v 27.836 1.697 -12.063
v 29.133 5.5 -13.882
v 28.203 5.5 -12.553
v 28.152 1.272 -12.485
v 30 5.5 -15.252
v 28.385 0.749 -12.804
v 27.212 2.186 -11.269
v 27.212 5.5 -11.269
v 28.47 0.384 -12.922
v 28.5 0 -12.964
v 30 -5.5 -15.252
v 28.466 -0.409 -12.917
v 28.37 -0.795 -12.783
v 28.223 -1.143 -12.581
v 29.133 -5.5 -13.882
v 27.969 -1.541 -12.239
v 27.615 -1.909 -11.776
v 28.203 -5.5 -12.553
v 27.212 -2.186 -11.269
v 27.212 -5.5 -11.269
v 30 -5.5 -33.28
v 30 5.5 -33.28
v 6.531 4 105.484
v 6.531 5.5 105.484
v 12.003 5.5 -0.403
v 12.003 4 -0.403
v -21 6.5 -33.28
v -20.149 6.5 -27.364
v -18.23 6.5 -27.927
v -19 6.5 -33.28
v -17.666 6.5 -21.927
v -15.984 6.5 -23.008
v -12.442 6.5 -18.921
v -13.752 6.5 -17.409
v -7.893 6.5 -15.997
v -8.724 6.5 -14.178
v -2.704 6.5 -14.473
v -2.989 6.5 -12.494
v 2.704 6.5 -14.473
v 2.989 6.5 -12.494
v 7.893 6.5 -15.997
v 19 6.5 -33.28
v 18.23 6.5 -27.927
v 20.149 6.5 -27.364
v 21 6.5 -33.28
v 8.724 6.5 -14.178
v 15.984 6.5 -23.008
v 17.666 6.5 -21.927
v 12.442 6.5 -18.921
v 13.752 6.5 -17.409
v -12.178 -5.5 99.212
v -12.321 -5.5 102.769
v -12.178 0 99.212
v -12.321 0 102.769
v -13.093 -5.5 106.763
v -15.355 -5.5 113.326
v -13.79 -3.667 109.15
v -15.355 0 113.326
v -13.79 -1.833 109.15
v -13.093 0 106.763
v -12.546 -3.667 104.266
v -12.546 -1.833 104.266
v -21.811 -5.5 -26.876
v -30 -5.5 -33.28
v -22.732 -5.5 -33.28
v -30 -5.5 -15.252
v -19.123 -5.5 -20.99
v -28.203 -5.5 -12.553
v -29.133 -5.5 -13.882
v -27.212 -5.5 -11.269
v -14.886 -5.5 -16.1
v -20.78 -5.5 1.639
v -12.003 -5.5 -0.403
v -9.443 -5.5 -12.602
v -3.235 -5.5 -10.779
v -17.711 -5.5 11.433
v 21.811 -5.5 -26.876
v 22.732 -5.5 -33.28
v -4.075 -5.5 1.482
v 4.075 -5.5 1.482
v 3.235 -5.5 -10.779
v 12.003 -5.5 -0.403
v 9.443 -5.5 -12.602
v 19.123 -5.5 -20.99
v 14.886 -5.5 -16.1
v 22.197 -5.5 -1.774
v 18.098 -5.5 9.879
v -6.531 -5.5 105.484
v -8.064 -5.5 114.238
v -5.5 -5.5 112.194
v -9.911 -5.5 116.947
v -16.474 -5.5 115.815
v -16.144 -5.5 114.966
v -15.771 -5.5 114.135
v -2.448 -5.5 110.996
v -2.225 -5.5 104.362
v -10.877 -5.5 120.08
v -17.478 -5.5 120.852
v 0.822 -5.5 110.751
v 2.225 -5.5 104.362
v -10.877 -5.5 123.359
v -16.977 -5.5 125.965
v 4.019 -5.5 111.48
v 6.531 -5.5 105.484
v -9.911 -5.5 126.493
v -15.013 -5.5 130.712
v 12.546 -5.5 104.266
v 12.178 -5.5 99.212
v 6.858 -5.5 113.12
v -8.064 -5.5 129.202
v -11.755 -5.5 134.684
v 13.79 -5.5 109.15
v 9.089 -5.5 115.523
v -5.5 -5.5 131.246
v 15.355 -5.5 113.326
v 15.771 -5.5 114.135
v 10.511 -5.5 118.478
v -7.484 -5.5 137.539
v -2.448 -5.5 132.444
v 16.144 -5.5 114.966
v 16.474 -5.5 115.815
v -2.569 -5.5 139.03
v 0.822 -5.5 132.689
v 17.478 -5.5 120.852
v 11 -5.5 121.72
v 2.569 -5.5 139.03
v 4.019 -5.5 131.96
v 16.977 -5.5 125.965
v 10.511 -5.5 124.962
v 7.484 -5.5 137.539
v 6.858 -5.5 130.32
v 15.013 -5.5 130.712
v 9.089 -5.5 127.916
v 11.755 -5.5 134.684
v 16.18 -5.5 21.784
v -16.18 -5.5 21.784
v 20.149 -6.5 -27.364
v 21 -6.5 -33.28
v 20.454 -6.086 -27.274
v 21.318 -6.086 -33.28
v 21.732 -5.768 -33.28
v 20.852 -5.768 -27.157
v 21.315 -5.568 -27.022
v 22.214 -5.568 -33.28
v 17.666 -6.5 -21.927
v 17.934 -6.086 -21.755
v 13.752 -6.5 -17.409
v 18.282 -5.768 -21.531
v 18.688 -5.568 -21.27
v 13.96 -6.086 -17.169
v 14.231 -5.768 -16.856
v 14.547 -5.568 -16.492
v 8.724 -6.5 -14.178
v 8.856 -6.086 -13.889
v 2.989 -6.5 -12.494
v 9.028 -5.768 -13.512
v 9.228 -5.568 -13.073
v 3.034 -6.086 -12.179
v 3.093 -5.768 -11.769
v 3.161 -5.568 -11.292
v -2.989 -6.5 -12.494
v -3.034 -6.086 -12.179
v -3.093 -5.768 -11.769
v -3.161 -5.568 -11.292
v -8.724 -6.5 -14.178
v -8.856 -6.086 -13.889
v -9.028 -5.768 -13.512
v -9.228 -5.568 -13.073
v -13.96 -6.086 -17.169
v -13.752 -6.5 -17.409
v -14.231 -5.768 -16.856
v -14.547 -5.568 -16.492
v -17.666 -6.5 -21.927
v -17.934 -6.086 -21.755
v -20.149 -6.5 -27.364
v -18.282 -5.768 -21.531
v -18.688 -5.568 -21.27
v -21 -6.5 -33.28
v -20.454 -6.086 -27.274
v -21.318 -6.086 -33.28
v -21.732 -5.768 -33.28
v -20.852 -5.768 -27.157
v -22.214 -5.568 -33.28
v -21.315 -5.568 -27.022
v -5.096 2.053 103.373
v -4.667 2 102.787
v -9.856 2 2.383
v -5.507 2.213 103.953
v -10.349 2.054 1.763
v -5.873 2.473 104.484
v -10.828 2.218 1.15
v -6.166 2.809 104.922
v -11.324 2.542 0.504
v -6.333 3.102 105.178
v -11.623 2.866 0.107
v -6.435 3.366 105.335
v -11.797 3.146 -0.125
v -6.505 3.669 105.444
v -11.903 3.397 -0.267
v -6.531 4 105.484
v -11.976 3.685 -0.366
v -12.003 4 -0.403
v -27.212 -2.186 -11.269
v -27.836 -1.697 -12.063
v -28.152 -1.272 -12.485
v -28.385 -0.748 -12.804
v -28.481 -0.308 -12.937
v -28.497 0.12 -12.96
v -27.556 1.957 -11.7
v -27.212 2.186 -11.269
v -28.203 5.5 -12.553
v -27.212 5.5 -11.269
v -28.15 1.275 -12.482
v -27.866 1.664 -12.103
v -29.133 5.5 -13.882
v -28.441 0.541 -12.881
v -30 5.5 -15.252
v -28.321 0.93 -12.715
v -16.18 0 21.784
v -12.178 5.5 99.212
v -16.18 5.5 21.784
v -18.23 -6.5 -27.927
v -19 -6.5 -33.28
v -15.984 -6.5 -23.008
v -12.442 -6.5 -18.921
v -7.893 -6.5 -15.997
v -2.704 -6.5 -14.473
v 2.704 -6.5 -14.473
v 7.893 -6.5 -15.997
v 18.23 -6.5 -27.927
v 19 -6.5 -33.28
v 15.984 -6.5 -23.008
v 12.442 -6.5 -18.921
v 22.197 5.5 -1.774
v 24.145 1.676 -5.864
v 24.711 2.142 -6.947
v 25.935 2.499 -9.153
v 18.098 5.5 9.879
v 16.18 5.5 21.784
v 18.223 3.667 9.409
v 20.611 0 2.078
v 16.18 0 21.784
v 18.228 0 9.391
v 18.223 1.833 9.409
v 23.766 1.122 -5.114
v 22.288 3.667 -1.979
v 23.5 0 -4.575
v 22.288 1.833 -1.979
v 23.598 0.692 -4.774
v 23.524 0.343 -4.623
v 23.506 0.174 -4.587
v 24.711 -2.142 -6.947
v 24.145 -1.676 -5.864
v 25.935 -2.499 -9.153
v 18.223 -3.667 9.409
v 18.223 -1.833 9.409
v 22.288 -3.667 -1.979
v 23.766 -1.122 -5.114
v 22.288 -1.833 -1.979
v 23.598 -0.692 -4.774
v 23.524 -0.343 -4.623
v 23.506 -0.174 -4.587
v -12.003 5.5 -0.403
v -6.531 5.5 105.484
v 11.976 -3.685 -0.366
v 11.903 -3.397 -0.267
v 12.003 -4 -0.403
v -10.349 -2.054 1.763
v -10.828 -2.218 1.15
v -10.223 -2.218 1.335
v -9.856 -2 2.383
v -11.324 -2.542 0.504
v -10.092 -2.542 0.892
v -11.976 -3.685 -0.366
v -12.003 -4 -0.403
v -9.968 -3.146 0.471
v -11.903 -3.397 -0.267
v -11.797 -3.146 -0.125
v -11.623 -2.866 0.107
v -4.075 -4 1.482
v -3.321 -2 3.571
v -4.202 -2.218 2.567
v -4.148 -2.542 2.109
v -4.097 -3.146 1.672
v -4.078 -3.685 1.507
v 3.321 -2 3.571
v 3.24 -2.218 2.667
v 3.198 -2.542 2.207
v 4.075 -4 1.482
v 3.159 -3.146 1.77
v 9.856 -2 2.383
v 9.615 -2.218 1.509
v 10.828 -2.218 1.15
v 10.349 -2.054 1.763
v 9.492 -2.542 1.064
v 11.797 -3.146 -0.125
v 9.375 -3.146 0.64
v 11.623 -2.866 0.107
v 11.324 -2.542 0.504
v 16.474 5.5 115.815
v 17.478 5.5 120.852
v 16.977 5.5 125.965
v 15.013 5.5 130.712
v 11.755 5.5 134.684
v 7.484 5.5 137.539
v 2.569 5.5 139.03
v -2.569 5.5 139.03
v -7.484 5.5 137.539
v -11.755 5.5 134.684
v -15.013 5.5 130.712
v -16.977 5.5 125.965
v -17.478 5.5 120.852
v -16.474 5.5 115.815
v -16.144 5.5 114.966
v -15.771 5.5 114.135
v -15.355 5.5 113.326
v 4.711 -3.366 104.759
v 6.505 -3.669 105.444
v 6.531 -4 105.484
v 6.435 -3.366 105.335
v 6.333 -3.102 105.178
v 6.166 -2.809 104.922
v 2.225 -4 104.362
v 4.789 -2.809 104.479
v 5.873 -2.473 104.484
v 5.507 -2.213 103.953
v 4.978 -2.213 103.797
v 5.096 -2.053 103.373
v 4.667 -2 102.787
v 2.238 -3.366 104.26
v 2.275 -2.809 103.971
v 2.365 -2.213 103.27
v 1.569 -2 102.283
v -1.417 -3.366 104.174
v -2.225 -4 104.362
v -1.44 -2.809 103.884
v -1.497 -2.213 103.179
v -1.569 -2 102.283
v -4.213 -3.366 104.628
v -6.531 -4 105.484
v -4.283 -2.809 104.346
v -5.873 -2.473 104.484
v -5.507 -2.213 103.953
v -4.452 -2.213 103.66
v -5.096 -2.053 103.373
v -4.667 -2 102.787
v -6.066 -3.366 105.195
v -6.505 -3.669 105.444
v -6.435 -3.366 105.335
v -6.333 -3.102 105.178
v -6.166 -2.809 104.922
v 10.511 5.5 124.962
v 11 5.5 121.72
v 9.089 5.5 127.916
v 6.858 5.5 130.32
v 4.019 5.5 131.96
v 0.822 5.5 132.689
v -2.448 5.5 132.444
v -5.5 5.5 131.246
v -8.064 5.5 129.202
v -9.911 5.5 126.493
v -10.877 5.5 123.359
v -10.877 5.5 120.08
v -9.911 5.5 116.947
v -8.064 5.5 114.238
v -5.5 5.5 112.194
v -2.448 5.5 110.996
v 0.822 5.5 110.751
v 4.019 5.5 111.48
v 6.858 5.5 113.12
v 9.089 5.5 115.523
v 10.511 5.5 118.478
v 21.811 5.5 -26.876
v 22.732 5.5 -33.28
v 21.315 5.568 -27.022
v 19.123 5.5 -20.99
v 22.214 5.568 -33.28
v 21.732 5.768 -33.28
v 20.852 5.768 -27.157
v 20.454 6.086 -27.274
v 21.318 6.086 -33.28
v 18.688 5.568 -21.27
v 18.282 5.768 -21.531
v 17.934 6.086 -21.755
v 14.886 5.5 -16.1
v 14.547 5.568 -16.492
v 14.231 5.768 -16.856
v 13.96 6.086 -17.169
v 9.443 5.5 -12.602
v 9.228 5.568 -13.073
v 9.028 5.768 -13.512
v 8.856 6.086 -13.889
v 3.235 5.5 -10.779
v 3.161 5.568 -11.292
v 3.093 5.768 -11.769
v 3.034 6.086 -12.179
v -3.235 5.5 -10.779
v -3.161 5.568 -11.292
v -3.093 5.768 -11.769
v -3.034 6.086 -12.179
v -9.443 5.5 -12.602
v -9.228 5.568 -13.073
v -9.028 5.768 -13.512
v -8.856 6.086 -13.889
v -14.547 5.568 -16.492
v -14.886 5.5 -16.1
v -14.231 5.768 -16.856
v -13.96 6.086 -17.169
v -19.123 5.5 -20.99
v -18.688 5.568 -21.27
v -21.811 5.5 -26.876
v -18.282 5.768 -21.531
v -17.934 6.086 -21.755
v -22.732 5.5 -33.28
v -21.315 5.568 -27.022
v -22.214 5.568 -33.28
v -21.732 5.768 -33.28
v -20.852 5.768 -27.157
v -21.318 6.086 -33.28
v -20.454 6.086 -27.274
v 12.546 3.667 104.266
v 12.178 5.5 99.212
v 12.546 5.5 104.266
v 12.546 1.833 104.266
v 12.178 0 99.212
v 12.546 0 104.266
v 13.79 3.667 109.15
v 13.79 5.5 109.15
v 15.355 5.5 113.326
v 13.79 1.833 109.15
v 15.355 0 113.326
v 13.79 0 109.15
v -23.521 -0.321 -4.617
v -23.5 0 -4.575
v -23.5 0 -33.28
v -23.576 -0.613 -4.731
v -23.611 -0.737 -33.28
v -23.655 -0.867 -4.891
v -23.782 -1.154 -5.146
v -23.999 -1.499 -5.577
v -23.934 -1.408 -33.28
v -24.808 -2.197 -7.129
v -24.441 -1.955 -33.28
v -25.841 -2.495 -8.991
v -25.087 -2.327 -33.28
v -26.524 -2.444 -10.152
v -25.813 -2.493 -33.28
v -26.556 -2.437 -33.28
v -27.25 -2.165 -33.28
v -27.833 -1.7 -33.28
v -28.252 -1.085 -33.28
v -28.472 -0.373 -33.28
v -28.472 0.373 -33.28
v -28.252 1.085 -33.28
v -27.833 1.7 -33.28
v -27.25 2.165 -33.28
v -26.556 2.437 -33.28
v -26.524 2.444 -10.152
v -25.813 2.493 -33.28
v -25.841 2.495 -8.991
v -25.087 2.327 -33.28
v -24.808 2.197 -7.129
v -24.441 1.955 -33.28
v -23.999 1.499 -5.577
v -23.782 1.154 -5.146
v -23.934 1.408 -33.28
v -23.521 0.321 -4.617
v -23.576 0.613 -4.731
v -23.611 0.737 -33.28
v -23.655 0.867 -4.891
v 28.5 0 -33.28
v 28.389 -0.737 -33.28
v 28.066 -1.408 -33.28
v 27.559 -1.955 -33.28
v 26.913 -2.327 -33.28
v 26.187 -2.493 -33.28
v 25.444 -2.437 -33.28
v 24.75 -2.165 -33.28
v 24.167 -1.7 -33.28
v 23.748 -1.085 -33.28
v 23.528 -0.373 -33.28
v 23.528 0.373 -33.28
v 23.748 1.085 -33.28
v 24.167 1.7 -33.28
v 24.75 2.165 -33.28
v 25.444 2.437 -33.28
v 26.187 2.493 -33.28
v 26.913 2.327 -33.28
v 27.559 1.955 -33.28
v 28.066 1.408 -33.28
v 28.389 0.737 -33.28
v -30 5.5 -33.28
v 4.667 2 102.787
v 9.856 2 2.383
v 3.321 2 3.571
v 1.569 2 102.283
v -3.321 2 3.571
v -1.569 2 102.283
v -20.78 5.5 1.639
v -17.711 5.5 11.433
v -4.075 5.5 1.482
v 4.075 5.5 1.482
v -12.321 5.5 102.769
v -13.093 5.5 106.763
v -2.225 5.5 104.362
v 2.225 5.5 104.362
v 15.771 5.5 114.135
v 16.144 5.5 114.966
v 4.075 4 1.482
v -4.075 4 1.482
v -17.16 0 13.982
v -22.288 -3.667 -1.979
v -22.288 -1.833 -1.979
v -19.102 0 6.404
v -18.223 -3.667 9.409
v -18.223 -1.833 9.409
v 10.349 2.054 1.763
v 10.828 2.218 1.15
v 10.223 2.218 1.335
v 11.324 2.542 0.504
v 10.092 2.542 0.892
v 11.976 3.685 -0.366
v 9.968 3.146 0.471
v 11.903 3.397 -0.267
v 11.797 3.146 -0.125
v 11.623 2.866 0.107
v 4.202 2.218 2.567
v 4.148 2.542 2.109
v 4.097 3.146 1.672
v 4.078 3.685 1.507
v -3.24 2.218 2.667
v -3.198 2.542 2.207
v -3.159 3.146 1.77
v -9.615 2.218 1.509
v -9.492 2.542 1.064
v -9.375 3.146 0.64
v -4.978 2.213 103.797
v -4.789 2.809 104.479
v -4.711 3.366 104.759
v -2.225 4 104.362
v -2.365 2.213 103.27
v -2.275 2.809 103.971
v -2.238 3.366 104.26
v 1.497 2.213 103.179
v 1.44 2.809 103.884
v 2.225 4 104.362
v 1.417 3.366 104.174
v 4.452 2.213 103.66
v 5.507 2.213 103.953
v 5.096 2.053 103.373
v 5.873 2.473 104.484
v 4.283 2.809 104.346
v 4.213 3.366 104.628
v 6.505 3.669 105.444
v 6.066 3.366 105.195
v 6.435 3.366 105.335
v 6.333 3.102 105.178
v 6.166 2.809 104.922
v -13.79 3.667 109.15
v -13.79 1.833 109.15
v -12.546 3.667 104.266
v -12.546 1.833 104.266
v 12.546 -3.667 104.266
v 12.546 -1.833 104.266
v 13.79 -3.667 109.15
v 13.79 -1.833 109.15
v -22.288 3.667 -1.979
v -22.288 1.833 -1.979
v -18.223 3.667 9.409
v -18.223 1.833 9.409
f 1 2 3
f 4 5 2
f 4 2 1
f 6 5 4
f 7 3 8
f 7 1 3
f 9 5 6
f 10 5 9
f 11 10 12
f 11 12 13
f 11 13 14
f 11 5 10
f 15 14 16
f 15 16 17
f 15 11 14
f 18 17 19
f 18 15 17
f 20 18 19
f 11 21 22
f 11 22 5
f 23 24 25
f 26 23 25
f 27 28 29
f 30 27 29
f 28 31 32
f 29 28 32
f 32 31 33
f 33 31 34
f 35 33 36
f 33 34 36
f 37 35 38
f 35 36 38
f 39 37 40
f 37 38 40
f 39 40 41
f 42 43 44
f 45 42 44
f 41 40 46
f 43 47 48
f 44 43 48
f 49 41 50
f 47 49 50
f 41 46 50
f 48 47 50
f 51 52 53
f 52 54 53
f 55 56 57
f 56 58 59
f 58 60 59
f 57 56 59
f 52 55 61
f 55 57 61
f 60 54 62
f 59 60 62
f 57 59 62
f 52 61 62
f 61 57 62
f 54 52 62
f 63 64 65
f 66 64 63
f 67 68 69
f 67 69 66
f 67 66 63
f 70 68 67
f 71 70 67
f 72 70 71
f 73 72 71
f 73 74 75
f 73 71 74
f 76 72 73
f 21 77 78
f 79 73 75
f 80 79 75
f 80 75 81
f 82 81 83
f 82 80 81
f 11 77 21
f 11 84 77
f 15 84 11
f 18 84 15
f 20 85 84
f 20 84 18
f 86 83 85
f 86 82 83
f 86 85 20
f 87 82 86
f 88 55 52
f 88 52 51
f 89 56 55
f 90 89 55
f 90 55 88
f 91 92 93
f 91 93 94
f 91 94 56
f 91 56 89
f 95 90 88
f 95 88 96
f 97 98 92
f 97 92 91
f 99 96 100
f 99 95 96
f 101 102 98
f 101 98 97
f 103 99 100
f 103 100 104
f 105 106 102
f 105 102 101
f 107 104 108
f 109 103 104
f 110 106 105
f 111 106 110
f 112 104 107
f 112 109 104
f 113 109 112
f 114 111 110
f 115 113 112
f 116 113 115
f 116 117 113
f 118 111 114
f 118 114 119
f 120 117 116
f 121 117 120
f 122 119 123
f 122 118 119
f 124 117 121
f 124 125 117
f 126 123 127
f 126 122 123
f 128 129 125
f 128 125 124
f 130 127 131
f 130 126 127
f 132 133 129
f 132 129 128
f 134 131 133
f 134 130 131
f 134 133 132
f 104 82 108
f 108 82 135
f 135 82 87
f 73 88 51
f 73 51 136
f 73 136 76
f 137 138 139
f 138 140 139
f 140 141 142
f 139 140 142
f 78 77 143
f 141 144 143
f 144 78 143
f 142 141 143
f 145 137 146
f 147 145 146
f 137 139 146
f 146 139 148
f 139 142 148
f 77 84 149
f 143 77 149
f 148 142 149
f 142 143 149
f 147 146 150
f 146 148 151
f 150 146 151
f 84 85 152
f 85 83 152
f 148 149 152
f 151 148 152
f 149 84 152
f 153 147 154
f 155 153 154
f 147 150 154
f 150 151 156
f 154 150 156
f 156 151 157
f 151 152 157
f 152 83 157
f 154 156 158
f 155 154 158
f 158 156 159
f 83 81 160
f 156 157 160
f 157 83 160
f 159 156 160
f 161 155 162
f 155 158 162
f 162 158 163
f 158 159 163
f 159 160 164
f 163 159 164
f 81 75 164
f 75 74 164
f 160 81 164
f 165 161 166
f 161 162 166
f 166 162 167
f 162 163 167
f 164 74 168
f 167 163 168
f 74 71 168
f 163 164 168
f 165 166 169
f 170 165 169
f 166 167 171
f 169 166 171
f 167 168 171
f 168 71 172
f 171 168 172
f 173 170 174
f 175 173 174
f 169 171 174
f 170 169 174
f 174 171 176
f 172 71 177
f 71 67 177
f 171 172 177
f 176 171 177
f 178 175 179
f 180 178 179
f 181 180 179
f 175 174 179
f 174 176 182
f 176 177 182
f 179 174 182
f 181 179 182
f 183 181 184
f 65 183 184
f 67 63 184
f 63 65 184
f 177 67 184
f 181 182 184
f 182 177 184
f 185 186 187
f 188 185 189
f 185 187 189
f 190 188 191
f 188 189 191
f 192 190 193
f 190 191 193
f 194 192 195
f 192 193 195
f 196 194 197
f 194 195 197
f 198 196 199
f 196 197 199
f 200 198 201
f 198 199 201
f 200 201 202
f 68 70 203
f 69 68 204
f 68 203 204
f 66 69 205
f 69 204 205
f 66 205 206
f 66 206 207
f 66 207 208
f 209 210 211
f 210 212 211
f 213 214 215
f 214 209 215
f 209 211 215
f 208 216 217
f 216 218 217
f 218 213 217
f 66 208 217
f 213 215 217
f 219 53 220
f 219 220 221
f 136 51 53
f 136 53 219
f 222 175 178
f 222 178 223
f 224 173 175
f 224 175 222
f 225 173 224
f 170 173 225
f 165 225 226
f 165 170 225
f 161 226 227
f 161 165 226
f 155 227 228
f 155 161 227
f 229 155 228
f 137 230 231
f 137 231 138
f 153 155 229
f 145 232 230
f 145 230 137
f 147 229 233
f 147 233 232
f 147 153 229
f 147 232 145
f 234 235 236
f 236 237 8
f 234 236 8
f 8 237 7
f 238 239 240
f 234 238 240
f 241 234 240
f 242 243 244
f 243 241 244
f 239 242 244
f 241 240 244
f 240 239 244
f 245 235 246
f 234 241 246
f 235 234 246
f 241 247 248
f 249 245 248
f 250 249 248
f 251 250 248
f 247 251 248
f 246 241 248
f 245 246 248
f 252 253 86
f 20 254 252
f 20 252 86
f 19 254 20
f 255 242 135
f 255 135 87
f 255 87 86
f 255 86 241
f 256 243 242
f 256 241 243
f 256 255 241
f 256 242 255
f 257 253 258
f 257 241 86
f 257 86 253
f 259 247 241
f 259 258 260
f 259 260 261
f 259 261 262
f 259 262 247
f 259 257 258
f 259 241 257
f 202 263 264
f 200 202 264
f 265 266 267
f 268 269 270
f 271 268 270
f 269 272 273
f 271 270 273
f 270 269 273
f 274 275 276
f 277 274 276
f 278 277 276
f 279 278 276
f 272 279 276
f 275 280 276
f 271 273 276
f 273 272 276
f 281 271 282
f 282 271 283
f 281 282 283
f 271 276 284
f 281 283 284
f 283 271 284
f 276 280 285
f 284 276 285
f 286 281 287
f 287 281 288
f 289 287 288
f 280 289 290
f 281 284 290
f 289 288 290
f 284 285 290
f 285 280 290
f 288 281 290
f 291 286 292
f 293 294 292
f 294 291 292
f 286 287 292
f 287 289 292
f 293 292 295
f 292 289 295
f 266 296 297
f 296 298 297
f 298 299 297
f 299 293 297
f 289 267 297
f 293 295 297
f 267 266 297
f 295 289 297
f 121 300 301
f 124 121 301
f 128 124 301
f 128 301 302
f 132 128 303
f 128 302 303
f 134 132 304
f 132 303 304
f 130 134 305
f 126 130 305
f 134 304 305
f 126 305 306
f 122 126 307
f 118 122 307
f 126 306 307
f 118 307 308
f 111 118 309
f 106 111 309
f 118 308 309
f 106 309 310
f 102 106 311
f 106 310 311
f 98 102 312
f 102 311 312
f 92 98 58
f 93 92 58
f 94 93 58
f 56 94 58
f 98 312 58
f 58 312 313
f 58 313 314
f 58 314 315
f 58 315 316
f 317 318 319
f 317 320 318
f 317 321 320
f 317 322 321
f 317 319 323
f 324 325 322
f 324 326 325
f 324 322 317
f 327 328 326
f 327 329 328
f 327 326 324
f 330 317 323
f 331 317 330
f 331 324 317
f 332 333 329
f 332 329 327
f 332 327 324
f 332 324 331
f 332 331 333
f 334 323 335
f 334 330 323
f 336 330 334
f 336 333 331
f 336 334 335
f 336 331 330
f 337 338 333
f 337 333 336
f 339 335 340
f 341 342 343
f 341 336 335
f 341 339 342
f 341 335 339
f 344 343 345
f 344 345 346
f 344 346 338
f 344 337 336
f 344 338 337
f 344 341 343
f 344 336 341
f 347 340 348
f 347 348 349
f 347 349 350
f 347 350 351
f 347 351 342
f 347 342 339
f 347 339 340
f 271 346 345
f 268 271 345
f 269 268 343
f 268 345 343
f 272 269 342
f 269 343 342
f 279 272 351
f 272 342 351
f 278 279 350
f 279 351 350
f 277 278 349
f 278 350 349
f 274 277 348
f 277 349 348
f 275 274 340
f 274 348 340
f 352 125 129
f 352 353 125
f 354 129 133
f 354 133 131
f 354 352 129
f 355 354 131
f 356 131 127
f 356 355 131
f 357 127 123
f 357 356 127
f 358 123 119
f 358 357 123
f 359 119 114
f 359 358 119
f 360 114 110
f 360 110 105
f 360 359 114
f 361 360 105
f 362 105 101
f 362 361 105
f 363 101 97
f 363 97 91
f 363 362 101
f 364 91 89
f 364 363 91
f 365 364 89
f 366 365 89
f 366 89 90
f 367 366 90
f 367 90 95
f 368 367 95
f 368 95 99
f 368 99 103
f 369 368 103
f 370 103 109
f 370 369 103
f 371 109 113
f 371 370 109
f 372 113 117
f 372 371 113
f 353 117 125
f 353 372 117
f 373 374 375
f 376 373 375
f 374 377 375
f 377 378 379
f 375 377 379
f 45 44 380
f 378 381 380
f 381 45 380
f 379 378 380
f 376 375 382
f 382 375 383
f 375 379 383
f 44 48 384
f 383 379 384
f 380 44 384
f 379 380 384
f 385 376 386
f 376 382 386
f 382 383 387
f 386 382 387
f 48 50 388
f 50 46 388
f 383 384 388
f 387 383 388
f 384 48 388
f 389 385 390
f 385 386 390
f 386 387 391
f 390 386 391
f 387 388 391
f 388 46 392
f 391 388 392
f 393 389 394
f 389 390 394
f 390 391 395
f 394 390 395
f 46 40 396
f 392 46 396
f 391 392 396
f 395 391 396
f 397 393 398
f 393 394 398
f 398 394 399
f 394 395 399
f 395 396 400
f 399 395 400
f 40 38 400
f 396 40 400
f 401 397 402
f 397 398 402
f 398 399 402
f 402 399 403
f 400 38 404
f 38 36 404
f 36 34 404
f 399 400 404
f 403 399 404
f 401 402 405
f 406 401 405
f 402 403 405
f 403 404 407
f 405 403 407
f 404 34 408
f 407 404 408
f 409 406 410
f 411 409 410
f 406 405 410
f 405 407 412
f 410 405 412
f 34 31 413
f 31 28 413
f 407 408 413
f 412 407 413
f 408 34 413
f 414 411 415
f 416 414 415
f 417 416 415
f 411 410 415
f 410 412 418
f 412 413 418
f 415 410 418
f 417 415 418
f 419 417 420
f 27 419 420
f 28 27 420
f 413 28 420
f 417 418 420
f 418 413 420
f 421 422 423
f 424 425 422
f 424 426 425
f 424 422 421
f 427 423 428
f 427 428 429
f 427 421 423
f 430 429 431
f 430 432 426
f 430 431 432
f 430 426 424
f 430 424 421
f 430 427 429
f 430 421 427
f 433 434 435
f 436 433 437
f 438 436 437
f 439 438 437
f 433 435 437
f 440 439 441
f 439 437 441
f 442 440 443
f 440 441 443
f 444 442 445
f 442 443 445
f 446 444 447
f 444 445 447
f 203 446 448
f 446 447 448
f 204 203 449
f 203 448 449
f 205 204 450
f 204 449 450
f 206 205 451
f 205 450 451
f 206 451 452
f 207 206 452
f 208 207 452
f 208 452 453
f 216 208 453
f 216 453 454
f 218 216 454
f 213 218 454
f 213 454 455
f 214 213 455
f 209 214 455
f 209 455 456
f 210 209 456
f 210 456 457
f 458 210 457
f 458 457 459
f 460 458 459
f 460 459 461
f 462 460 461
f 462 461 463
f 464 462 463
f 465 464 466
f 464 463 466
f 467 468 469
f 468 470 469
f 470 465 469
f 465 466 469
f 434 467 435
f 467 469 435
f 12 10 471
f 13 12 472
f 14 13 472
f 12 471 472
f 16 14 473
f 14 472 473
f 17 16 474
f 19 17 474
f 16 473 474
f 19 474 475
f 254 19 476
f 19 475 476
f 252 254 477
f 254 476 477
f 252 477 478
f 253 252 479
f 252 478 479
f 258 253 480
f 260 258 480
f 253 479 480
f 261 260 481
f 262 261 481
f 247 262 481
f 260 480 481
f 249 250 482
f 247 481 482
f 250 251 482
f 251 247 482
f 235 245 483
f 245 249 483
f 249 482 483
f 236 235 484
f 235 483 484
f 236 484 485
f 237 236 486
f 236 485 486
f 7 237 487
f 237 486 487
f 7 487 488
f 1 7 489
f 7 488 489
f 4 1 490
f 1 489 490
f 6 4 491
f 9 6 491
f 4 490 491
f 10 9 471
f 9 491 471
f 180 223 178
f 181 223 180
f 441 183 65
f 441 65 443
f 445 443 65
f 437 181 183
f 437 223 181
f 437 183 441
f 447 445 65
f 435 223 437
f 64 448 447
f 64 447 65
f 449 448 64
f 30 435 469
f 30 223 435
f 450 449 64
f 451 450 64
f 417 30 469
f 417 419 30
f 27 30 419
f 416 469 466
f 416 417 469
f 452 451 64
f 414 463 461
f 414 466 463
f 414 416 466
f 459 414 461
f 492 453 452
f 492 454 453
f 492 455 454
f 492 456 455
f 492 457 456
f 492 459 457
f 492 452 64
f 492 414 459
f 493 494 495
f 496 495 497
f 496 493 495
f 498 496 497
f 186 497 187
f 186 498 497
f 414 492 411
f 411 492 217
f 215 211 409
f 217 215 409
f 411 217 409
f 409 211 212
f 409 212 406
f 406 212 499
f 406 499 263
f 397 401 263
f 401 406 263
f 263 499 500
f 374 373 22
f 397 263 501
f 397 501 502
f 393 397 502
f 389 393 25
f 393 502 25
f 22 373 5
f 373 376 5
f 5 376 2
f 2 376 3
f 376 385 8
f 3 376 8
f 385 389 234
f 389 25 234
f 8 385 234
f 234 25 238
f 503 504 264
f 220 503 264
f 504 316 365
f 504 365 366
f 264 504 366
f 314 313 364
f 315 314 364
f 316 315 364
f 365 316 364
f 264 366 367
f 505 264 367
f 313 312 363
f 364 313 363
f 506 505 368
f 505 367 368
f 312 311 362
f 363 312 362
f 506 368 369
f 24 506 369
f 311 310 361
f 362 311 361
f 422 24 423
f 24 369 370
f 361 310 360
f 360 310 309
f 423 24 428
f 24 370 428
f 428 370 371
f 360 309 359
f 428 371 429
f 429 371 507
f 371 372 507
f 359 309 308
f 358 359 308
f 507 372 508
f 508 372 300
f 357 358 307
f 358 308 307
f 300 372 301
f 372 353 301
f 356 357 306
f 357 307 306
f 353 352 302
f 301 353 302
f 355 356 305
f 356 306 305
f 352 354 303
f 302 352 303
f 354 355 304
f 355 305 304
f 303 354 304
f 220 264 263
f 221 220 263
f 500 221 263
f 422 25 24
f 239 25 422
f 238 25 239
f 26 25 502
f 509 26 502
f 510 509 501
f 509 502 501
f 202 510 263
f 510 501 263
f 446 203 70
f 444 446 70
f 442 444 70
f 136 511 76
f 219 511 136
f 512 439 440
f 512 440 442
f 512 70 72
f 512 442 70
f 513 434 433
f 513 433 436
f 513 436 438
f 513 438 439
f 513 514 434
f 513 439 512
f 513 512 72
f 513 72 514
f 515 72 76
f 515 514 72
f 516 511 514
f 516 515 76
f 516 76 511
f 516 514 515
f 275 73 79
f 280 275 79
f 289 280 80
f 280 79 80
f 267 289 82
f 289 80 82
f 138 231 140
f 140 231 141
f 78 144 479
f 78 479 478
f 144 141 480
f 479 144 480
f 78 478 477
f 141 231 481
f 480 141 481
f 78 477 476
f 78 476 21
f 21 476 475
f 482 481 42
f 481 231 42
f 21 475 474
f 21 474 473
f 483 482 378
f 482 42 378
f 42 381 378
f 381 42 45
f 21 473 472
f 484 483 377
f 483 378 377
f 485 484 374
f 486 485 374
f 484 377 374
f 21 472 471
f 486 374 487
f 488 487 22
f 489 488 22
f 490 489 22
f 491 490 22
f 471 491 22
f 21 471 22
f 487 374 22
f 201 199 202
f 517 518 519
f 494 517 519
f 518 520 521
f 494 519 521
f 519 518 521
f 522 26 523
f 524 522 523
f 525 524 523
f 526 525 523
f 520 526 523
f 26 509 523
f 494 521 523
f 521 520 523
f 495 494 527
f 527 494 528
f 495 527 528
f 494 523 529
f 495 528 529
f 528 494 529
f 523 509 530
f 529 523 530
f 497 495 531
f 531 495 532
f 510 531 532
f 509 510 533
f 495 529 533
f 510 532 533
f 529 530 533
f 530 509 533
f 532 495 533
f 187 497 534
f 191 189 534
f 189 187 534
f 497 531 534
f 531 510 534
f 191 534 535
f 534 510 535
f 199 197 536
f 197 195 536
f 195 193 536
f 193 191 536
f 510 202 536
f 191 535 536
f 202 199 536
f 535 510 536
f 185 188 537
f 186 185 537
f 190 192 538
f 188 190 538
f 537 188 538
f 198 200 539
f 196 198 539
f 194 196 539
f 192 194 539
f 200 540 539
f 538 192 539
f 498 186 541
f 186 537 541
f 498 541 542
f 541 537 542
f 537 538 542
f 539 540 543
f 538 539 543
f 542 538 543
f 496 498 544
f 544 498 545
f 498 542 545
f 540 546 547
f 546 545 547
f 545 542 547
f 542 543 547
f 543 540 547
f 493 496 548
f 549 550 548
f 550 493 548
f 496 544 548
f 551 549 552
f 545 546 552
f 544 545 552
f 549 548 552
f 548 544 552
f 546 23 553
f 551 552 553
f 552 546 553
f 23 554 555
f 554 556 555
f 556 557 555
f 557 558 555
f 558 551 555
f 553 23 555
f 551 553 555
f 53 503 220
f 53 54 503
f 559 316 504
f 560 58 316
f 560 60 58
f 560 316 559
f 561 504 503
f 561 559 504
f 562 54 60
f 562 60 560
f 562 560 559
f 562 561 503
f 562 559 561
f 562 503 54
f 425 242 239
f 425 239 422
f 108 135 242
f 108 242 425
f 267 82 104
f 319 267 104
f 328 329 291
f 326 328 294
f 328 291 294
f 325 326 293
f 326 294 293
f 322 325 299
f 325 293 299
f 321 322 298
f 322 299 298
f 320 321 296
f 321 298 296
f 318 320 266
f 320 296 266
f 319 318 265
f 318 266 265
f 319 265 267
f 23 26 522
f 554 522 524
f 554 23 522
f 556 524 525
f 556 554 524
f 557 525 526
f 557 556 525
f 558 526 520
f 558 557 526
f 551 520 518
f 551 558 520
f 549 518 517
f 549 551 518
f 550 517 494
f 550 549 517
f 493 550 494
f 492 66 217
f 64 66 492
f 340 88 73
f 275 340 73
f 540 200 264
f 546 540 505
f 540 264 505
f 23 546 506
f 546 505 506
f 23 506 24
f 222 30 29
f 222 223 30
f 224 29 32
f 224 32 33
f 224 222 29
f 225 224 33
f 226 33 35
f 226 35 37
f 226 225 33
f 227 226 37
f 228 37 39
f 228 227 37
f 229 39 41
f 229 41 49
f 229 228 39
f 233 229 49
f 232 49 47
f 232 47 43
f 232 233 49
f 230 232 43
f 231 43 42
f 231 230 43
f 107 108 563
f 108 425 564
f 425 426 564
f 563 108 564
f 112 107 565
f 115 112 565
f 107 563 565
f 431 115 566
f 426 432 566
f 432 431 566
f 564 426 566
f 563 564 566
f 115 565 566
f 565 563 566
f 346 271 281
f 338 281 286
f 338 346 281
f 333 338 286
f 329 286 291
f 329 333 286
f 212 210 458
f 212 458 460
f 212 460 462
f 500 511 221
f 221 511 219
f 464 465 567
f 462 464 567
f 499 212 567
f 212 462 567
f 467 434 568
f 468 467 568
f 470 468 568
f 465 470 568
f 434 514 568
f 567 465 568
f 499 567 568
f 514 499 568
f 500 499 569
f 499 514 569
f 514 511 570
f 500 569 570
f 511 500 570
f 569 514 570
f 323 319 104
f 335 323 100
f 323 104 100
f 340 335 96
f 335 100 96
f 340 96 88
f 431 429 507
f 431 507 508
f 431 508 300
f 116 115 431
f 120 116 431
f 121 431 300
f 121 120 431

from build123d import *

# Parameters (mm, degrees)
F0_R         = 11
F1_DEPTH     = 5.5
F3_DEPTH     = 3.5
F5_DEPTH     = 3.5
F6_R         = 2.5
F7_DEPTH     = 42.164
F8_DEPTH     = 6.5
F9_T1_DEPTH  = 116.0281232172
F9_T3_DEPTH  = 116.0281232172
F9_T5_DEPTH  = 116.0281232172
F9_T7_DEPTH  = 116.0281232172
F9_T10_ANGLE = 180
F9_T12_ANGLE = 180
F9_T14_ANGLE = 56.4844529803
F9_T16_ANGLE = 76.5675906158
F9_T18_ANGLE = 76.5675906158
F9_T20_ANGLE = 56.4844529803


# Not quite as in the source:
# - a fillet or chamfer that OpenCascade refuses, or shapes differently, is made with other operations: its cross-section is extruded or revolved along the edge and cut away or added


with BuildPart() as f1:
    # F0 (on Front) → F1 (new body, symmetric)
    with BuildSketch(Plane.XZ):
        with BuildLine():
            ThreePointArc((-19, -33.2800959392), (0, -14.2800959392), (19, -33.2800959392))
            Line((19, -33.2800959392), (21, -33.2800959392))
            ThreePointArc((21, -33.2800959392), (0, -12.2800959392), (-21, -33.2800959392))
            Line((-21, -33.2800959392), (-19, -33.2800959392))
        make_face()
        with BuildLine():
            ThreePointArc((-21, -33.2800959392), (0, -12.2800959392), (21, -33.2800959392))
            Line((21, -33.2800959392), (30, -33.2800959392))
            Line((30, -33.2800959392), (30, -15.2523395618))
            add(Edge.make_bspline(
                [(27.2124389343, -11.2691176046), (28.1709489037, -12.7879287388), (29.112646753, -14.1276291325), (30, -15.2523395618)],
                knots=[33.1369304212, 33.1369304212, 33.1369304212, 33.1369304212, 39.5306887603, 39.5306887603, 39.5306887603, 39.5306887603], degree=3))
            ThreePointArc((27.2124389343, -11.2691176046), (22.7195127023, -6.6563519768), (17.4575728273, -2.9447510263))
            Line((17.4575728273, -2.9447510263), (16.1795605017, 21.7837348243))
            Line((16.1795605017, 21.7837348243), (12.1779068373, 99.2124372244))
            Line((12.1779068373, 99.2124372244), (11.6878243777, 108.6951291562))
            ThreePointArc((11.6878243777, 108.6951291562), (13.7183182045, 110.8544659363), (15.3552635835, 113.3255082945))
            add(Edge.make_bspline(
                [(15.3552635835, 113.3255082945), (15.770003684, 114.3065445088), (16.1590697648, 115.1520105897), (16.4735386522, 115.8146077708)],
                knots=[13.5101438027, 13.5101438027, 13.5101438027, 13.5101438027, 17.1488926622, 17.1488926622, 17.1488926622, 17.1488926622], degree=3))
            ThreePointArc((16.4735386522, 115.8146077708), (0, 139.2199040608), (-16.4735386522, 115.8146077708))
            add(Edge.make_bspline(
                [(-16.4735386522, 115.8146077708), (-16.1590697648, 115.1520105897), (-15.770003684, 114.3065445088), (-15.3552635835, 113.3255082945)],
                knots=[0, 0, 0, 0, 3.6387488595, 3.6387488595, 3.6387488595, 3.6387488595], degree=3))
            ThreePointArc((-15.3552635835, 113.3255082945), (-13.7183182045, 110.8544659363), (-11.6878243777, 108.6951291562))
            Line((-11.6878243777, 108.6951291562), (-12.1779068373, 99.2124372244))
            Line((-12.1779068373, 99.2124372244), (-16.1795605017, 21.7837348243))
            Line((-16.1795605017, 21.7837348243), (-17.4575728273, -2.9447510263))
            ThreePointArc((-17.4575728273, -2.9447510263), (-22.7195127023, -6.6563519768), (-27.2124389343, -11.2691176046))
            add(Edge.make_bspline(
                [(-30, -15.2523395618), (-29.112646753, -14.1276291325), (-28.1709489037, -12.7879287388), (-27.2124389343, -11.2691176046)],
                knots=[0, 0, 0, 0, 6.3937583391, 6.3937583391, 6.3937583391, 6.3937583391], degree=3))
            Line((-30, -15.2523395618), (-30, -33.2800959392))
            Line((-30, -33.2800959392), (-21, -33.2800959392))
        make_face()
        with Locations((0, 121.7199040608)):
            Circle(F0_R, mode=Mode.SUBTRACT)
        with BuildLine():
            add(Edge.make_bspline(
                [(27.2124389343, -11.2691176046), (28.1709489037, -12.7879287388), (29.112646753, -14.1276291325), (30, -15.2523395618)],
                knots=[33.1369304212, 33.1369304212, 33.1369304212, 33.1369304212, 39.5306887603, 39.5306887603, 39.5306887603, 39.5306887603], degree=3))
            ThreePointArc((30, -15.2523395618), (28.6754652359, -13.2122686152), (27.2124389343, -11.2691176046))
        make_face()
        with BuildLine():
            ThreePointArc((-27.2124389343, -11.2691176046), (-28.6754652359, -13.2122686152), (-30, -15.2523395618))
            add(Edge.make_bspline(
                [(-30, -15.2523395618), (-29.112646753, -14.1276291325), (-28.1709489037, -12.7879287388), (-27.2124389343, -11.2691176046)],
                knots=[0, 0, 0, 0, 6.3937583391, 6.3937583391, 6.3937583391, 6.3937583391], degree=3))
        make_face()
        with BuildLine():
            ThreePointArc((17.4575728273, -2.9447510263), (22.7195127023, -6.6563519768), (27.2124389343, -11.2691176046))
            add(Edge.make_bspline(
                [(16.1795605017, 21.7837348243), (16.8255200796, 9.2849490449), (22.2447694546, -3.3975753584), (27.2124389343, -11.2691176046)],
                knots=[0, 0, 0, 0, 33.1369304212, 33.1369304212, 33.1369304212, 33.1369304212], degree=3))
            Line((16.1795605017, 21.7837348243), (17.4575728273, -2.9447510263))
        make_face()
        with BuildLine():
            add(Edge.make_bspline(
                [(-27.2124389343, -11.2691176046), (-22.2447694546, -3.3975753584), (-16.8255200796, 9.2849490449), (-16.1795605017, 21.7837348243)],
                knots=[6.3937583391, 6.3937583391, 6.3937583391, 6.3937583391, 39.5306887603, 39.5306887603, 39.5306887603, 39.5306887603], degree=3))
            ThreePointArc((-27.2124389343, -11.2691176046), (-22.7195127023, -6.6563519768), (-17.4575728273, -2.9447510263))
            Line((-17.4575728273, -2.9447510263), (-16.1795605017, 21.7837348243))
        make_face()
        with BuildLine():
            Line((11.6878243777, 108.6951291562), (12.1779068373, 99.2124372244))
            add(Edge.make_bspline(
                [(12.1779068373, 99.2124372244), (11.9216008752, 104.1717464831), (13.8153940804, 109.6830639154), (15.3552635835, 113.3255082945)],
                knots=[0, 0, 0, 0, 13.5101438027, 13.5101438027, 13.5101438027, 13.5101438027], degree=3))
            ThreePointArc((15.3552635835, 113.3255082945), (13.7183182045, 110.8544659363), (11.6878243777, 108.6951291562))
        make_face()
        with BuildLine():
            add(Edge.make_bspline(
                [(-15.3552635835, 113.3255082945), (-13.8153940804, 109.6830639154), (-11.9216008752, 104.1717464831), (-12.1779068373, 99.2124372244)],
                knots=[3.6387488595, 3.6387488595, 3.6387488595, 3.6387488595, 17.1488926622, 17.1488926622, 17.1488926622, 17.1488926622], degree=3))
            Line((-12.1779068373, 99.2124372244), (-11.6878243777, 108.6951291562))
            ThreePointArc((-11.6878243777, 108.6951291562), (-13.7183182045, 110.8544659363), (-15.3552635835, 113.3255082945))
        make_face()
        with BuildLine():
            add(Edge.make_bspline(
                [(15.3552635835, 113.3255082945), (15.770003684, 114.3065445088), (16.1590697648, 115.1520105897), (16.4735386522, 115.8146077708)],
                knots=[13.5101438027, 13.5101438027, 13.5101438027, 13.5101438027, 17.1488926622, 17.1488926622, 17.1488926622, 17.1488926622], degree=3))
            ThreePointArc((15.3552635835, 113.3255082945), (15.9629905403, 114.5482283146), (16.4735386522, 115.8146077708))
        make_face()
        with BuildLine():
            ThreePointArc((-16.4735386522, 115.8146077708), (-15.9629905403, 114.5482283146), (-15.3552635835, 113.3255082945))
            add(Edge.make_bspline(
                [(-16.4735386522, 115.8146077708), (-16.1590697648, 115.1520105897), (-15.770003684, 114.3065445088), (-15.3552635835, 113.3255082945)],
                knots=[0, 0, 0, 0, 3.6387488595, 3.6387488595, 3.6387488595, 3.6387488595], degree=3))
        make_face()
    extrude(amount=F1_DEPTH, both=True)

    # F2 (on face) → F3 (cut)
    with BuildSketch(Plane.XZ.offset(5.5)):
        with BuildLine():
            ThreePointArc((6.5306906354, 105.4841386084), (0, 104.2199040608), (-6.5306906354, 105.4841386084))
            Line((-6.5306906354, 105.4841386084), (-12.0031098982, -0.4026667092))
            ThreePointArc((-12.0031098982, -0.4026667092), (0, 1.7199040608), (12.0031098982, -0.4026667092))
            Line((12.0031098982, -0.4026667092), (6.5306906354, 105.4841386084))
        make_face()
    extrude(amount=-F3_DEPTH, mode=Mode.SUBTRACT)

    # F4 (on face) → F5 (cut)
    with BuildSketch(Plane(origin=(0, 5.5, 0), x_dir=(-1, 0, 0), z_dir=(0, 1, 0))):
        with BuildLine():
            ThreePointArc((6.5306906354, 105.4841386084), (0, 104.2199040608), (-6.5306906354, 105.4841386084))
            Line((-6.5306906354, 105.4841386084), (-12.0031098982, -0.4026667092))
            ThreePointArc((-12.0031098982, -0.4026667092), (0, 1.7199040608), (12.0031098982, -0.4026667092))
            Line((12.0031098982, -0.4026667092), (6.5306906354, 105.4841386084))
        make_face()
    extrude(amount=-F5_DEPTH, mode=Mode.SUBTRACT)

    # F6 (on face) → F7 (cut)
    with BuildSketch(Plane(origin=(0, 0, -33.2800959392), x_dir=(1, 0, 0), z_dir=(0, 0, -1))):
        with Locations((-26, 0)):
            Circle(F6_R)
        with Locations((26, 0)):
            Circle(F6_R)
    extrude(amount=-F7_DEPTH, mode=Mode.SUBTRACT)

    # F0 (on Front) → F8 (join, symmetric)
    with BuildSketch(Plane.XZ):
        with BuildLine():
            ThreePointArc((-19, -33.2800959392), (0, -14.2800959392), (19, -33.2800959392))
            Line((19, -33.2800959392), (21, -33.2800959392))
            ThreePointArc((21, -33.2800959392), (0, -12.2800959392), (-21, -33.2800959392))
            Line((-21, -33.2800959392), (-19, -33.2800959392))
        make_face()
    extrude(amount=F8_DEPTH, both=True)

    # F9: fillet of radius 2 on 10 edges, made by hand

    # F9_s2 → F9_t1 (join)
    with BuildSketch(Plane(origin=(0.3107945998, 0, -6.0136195165), x_dir=(0, 1, 0), z_dir=(-0.0516129032, 0, 0.9986671659))):
        with BuildLine():
            ThreePointArc((-2, -9.966328946), (-2.5857864376, -11.3805425083), (-4, -11.966328946))
            Line((-4, -11.966328946), (-2, -11.966328946))
            Line((-2, -11.966328946), (-2, -9.966328946))
        make_face()
    extrude(amount=F9_T1_DEPTH)

    # F9_s4 → F9_t3 (join)
    with BuildSketch(Plane(origin=(5.6777536953, 0, 109.85985746), x_dir=(0, 1, 0), z_dir=(-0.0516129032, 0, -0.9986671659))):
        with BuildLine():
            ThreePointArc((-2, -9.966328946), (-2.5857864376, -11.3805425083), (-4, -11.966328946))
            Line((-4, -11.966328946), (-2, -11.966328946))
            Line((-2, -11.966328946), (-2, -9.966328946))
        make_face()
    extrude(amount=F9_T3_DEPTH)

    # F9_s6 → F9_t5 (join)
    with BuildSketch(Plane(origin=(-0.3107945998, 0, -6.0136195165), x_dir=(0, 1, 0), z_dir=(0.0516129032, 0, 0.9986671659))):
        with BuildLine():
            ThreePointArc((2, 9.966328946), (2.5857864376, 11.3805425083), (4, 11.966328946))
            Line((4, 11.966328946), (2, 11.966328946))
            Line((2, 11.966328946), (2, 9.966328946))
        make_face()
    extrude(amount=F9_T5_DEPTH)

    # F9_s8 → F9_t7 (join)
    with BuildSketch(Plane(origin=(-5.6777536953, 0, 109.85985746), x_dir=(0, 1, 0), z_dir=(0.0516129032, 0, -0.9986671659))):
        with BuildLine():
            ThreePointArc((4, 11.966328946), (2.5857864376, 11.3805425083), (2, 9.966328946))
            Line((2, 9.966328946), (2, 11.966328946))
            Line((2, 11.966328946), (4, 11.966328946))
        make_face()
    extrude(amount=F9_T7_DEPTH)

    # F9_s9 → F9_t10 (revolve)
    with BuildSketch(Plane.XY.offset(-33.2800959392)):
        with BuildLine():
            ThreePointArc((21, -6.5), (21.7320508076, -5.7679491924), (22.7320508076, -5.5))
            Line((22.7320508076, -5.5), (21, -5.5))
            Line((21, -5.5), (21, -6.5))
        make_face()
    revolve(axis=Axis((0, -5.5, -33.2800959392), (0, -1, 0)), revolution_arc=F9_T10_ANGLE)

    # F9_s11 → F9_t12 (revolve)
    with BuildSketch(Plane.XY.offset(-33.2800959392)):
        with BuildLine():
            ThreePointArc((22.7320508076, 5.5), (21.7320508076, 5.7679491924), (21, 6.5))
            Line((21, 6.5), (21, 5.5))
            Line((21, 5.5), (22.7320508076, 5.5))
        make_face()
    revolve(axis=Axis((0, 5.5, -33.2800959392), (0, -1, 0)), revolution_arc=F9_T12_ANGLE)

    # F9_s13 → F9_t14 (revolve)
    with BuildSketch(Plane(origin=(-13.8734074516, 0, -7.4520252165), x_dir=(0, 1, 0), z_dir=(-0.880954947, 0, -0.4732001494))):
        with BuildLine():
            ThreePointArc((-2, -7.6817348471), (-2.5857864376, -6.2675212848), (-4, -5.6817348471))
            Line((-4, -5.6817348471), (-2, -5.6817348471))
            Line((-2, -5.6817348471), (-2, -7.6817348471))
        make_face()
    revolve(axis=Axis((0, -2, -33.2800959392), (0, 1, 0)), revolution_arc=F9_T14_ANGLE)

    # F9_s15 → F9_t16 (revolve)
    with BuildSketch(Plane(origin=(59.1951057851, 0, 46.7222997417), x_dir=(0, 1, 0), z_dir=(0.7849516283, 0, 0.6195570525))):
        with BuildLine():
            ThreePointArc((-4, 78.044236888), (-2.5857864376, 77.4584504504), (-2, 76.044236888))
            Line((-2, 76.044236888), (-2, 78.044236888))
            Line((-2, 78.044236888), (-4, 78.044236888))
        make_face()
    revolve(axis=Axis((0, -2, 121.7199040608), (0, 1, 0)), revolution_arc=F9_T16_ANGLE)

    # F9_s17 → F9_t18 (revolve)
    with BuildSketch(Plane(origin=(-59.1951057851, 0, 46.7222997417), x_dir=(0, 1, 0), z_dir=(-0.7849516283, 0, 0.6195570525))):
        with BuildLine():
            ThreePointArc((2, -76.044236888), (2.5857864376, -77.4584504504), (4, -78.044236888))
            Line((4, -78.044236888), (2, -78.044236888))
            Line((2, -78.044236888), (2, -76.044236888))
        make_face()
    revolve(axis=Axis((0, 2, 121.7199040608), (0, -1, 0)), revolution_arc=F9_T18_ANGLE)

    # F9_s19 → F9_t20 (revolve)
    with BuildSketch(Plane(origin=(13.8734074516, 0, -7.4520252165), x_dir=(0, 1, 0), z_dir=(0.880954947, 0, -0.4732001494))):
        with BuildLine():
            ThreePointArc((2, 7.6817348471), (2.5857864376, 6.2675212848), (4, 5.6817348471))
            Line((4, 5.6817348471), (2, 5.6817348471))
            Line((2, 5.6817348471), (2, 7.6817348471))
        make_face()
    revolve(axis=Axis((0, 2, -33.2800959392), (0, -1, 0)), revolution_arc=F9_T20_ANGLE)


solid = f1.part
